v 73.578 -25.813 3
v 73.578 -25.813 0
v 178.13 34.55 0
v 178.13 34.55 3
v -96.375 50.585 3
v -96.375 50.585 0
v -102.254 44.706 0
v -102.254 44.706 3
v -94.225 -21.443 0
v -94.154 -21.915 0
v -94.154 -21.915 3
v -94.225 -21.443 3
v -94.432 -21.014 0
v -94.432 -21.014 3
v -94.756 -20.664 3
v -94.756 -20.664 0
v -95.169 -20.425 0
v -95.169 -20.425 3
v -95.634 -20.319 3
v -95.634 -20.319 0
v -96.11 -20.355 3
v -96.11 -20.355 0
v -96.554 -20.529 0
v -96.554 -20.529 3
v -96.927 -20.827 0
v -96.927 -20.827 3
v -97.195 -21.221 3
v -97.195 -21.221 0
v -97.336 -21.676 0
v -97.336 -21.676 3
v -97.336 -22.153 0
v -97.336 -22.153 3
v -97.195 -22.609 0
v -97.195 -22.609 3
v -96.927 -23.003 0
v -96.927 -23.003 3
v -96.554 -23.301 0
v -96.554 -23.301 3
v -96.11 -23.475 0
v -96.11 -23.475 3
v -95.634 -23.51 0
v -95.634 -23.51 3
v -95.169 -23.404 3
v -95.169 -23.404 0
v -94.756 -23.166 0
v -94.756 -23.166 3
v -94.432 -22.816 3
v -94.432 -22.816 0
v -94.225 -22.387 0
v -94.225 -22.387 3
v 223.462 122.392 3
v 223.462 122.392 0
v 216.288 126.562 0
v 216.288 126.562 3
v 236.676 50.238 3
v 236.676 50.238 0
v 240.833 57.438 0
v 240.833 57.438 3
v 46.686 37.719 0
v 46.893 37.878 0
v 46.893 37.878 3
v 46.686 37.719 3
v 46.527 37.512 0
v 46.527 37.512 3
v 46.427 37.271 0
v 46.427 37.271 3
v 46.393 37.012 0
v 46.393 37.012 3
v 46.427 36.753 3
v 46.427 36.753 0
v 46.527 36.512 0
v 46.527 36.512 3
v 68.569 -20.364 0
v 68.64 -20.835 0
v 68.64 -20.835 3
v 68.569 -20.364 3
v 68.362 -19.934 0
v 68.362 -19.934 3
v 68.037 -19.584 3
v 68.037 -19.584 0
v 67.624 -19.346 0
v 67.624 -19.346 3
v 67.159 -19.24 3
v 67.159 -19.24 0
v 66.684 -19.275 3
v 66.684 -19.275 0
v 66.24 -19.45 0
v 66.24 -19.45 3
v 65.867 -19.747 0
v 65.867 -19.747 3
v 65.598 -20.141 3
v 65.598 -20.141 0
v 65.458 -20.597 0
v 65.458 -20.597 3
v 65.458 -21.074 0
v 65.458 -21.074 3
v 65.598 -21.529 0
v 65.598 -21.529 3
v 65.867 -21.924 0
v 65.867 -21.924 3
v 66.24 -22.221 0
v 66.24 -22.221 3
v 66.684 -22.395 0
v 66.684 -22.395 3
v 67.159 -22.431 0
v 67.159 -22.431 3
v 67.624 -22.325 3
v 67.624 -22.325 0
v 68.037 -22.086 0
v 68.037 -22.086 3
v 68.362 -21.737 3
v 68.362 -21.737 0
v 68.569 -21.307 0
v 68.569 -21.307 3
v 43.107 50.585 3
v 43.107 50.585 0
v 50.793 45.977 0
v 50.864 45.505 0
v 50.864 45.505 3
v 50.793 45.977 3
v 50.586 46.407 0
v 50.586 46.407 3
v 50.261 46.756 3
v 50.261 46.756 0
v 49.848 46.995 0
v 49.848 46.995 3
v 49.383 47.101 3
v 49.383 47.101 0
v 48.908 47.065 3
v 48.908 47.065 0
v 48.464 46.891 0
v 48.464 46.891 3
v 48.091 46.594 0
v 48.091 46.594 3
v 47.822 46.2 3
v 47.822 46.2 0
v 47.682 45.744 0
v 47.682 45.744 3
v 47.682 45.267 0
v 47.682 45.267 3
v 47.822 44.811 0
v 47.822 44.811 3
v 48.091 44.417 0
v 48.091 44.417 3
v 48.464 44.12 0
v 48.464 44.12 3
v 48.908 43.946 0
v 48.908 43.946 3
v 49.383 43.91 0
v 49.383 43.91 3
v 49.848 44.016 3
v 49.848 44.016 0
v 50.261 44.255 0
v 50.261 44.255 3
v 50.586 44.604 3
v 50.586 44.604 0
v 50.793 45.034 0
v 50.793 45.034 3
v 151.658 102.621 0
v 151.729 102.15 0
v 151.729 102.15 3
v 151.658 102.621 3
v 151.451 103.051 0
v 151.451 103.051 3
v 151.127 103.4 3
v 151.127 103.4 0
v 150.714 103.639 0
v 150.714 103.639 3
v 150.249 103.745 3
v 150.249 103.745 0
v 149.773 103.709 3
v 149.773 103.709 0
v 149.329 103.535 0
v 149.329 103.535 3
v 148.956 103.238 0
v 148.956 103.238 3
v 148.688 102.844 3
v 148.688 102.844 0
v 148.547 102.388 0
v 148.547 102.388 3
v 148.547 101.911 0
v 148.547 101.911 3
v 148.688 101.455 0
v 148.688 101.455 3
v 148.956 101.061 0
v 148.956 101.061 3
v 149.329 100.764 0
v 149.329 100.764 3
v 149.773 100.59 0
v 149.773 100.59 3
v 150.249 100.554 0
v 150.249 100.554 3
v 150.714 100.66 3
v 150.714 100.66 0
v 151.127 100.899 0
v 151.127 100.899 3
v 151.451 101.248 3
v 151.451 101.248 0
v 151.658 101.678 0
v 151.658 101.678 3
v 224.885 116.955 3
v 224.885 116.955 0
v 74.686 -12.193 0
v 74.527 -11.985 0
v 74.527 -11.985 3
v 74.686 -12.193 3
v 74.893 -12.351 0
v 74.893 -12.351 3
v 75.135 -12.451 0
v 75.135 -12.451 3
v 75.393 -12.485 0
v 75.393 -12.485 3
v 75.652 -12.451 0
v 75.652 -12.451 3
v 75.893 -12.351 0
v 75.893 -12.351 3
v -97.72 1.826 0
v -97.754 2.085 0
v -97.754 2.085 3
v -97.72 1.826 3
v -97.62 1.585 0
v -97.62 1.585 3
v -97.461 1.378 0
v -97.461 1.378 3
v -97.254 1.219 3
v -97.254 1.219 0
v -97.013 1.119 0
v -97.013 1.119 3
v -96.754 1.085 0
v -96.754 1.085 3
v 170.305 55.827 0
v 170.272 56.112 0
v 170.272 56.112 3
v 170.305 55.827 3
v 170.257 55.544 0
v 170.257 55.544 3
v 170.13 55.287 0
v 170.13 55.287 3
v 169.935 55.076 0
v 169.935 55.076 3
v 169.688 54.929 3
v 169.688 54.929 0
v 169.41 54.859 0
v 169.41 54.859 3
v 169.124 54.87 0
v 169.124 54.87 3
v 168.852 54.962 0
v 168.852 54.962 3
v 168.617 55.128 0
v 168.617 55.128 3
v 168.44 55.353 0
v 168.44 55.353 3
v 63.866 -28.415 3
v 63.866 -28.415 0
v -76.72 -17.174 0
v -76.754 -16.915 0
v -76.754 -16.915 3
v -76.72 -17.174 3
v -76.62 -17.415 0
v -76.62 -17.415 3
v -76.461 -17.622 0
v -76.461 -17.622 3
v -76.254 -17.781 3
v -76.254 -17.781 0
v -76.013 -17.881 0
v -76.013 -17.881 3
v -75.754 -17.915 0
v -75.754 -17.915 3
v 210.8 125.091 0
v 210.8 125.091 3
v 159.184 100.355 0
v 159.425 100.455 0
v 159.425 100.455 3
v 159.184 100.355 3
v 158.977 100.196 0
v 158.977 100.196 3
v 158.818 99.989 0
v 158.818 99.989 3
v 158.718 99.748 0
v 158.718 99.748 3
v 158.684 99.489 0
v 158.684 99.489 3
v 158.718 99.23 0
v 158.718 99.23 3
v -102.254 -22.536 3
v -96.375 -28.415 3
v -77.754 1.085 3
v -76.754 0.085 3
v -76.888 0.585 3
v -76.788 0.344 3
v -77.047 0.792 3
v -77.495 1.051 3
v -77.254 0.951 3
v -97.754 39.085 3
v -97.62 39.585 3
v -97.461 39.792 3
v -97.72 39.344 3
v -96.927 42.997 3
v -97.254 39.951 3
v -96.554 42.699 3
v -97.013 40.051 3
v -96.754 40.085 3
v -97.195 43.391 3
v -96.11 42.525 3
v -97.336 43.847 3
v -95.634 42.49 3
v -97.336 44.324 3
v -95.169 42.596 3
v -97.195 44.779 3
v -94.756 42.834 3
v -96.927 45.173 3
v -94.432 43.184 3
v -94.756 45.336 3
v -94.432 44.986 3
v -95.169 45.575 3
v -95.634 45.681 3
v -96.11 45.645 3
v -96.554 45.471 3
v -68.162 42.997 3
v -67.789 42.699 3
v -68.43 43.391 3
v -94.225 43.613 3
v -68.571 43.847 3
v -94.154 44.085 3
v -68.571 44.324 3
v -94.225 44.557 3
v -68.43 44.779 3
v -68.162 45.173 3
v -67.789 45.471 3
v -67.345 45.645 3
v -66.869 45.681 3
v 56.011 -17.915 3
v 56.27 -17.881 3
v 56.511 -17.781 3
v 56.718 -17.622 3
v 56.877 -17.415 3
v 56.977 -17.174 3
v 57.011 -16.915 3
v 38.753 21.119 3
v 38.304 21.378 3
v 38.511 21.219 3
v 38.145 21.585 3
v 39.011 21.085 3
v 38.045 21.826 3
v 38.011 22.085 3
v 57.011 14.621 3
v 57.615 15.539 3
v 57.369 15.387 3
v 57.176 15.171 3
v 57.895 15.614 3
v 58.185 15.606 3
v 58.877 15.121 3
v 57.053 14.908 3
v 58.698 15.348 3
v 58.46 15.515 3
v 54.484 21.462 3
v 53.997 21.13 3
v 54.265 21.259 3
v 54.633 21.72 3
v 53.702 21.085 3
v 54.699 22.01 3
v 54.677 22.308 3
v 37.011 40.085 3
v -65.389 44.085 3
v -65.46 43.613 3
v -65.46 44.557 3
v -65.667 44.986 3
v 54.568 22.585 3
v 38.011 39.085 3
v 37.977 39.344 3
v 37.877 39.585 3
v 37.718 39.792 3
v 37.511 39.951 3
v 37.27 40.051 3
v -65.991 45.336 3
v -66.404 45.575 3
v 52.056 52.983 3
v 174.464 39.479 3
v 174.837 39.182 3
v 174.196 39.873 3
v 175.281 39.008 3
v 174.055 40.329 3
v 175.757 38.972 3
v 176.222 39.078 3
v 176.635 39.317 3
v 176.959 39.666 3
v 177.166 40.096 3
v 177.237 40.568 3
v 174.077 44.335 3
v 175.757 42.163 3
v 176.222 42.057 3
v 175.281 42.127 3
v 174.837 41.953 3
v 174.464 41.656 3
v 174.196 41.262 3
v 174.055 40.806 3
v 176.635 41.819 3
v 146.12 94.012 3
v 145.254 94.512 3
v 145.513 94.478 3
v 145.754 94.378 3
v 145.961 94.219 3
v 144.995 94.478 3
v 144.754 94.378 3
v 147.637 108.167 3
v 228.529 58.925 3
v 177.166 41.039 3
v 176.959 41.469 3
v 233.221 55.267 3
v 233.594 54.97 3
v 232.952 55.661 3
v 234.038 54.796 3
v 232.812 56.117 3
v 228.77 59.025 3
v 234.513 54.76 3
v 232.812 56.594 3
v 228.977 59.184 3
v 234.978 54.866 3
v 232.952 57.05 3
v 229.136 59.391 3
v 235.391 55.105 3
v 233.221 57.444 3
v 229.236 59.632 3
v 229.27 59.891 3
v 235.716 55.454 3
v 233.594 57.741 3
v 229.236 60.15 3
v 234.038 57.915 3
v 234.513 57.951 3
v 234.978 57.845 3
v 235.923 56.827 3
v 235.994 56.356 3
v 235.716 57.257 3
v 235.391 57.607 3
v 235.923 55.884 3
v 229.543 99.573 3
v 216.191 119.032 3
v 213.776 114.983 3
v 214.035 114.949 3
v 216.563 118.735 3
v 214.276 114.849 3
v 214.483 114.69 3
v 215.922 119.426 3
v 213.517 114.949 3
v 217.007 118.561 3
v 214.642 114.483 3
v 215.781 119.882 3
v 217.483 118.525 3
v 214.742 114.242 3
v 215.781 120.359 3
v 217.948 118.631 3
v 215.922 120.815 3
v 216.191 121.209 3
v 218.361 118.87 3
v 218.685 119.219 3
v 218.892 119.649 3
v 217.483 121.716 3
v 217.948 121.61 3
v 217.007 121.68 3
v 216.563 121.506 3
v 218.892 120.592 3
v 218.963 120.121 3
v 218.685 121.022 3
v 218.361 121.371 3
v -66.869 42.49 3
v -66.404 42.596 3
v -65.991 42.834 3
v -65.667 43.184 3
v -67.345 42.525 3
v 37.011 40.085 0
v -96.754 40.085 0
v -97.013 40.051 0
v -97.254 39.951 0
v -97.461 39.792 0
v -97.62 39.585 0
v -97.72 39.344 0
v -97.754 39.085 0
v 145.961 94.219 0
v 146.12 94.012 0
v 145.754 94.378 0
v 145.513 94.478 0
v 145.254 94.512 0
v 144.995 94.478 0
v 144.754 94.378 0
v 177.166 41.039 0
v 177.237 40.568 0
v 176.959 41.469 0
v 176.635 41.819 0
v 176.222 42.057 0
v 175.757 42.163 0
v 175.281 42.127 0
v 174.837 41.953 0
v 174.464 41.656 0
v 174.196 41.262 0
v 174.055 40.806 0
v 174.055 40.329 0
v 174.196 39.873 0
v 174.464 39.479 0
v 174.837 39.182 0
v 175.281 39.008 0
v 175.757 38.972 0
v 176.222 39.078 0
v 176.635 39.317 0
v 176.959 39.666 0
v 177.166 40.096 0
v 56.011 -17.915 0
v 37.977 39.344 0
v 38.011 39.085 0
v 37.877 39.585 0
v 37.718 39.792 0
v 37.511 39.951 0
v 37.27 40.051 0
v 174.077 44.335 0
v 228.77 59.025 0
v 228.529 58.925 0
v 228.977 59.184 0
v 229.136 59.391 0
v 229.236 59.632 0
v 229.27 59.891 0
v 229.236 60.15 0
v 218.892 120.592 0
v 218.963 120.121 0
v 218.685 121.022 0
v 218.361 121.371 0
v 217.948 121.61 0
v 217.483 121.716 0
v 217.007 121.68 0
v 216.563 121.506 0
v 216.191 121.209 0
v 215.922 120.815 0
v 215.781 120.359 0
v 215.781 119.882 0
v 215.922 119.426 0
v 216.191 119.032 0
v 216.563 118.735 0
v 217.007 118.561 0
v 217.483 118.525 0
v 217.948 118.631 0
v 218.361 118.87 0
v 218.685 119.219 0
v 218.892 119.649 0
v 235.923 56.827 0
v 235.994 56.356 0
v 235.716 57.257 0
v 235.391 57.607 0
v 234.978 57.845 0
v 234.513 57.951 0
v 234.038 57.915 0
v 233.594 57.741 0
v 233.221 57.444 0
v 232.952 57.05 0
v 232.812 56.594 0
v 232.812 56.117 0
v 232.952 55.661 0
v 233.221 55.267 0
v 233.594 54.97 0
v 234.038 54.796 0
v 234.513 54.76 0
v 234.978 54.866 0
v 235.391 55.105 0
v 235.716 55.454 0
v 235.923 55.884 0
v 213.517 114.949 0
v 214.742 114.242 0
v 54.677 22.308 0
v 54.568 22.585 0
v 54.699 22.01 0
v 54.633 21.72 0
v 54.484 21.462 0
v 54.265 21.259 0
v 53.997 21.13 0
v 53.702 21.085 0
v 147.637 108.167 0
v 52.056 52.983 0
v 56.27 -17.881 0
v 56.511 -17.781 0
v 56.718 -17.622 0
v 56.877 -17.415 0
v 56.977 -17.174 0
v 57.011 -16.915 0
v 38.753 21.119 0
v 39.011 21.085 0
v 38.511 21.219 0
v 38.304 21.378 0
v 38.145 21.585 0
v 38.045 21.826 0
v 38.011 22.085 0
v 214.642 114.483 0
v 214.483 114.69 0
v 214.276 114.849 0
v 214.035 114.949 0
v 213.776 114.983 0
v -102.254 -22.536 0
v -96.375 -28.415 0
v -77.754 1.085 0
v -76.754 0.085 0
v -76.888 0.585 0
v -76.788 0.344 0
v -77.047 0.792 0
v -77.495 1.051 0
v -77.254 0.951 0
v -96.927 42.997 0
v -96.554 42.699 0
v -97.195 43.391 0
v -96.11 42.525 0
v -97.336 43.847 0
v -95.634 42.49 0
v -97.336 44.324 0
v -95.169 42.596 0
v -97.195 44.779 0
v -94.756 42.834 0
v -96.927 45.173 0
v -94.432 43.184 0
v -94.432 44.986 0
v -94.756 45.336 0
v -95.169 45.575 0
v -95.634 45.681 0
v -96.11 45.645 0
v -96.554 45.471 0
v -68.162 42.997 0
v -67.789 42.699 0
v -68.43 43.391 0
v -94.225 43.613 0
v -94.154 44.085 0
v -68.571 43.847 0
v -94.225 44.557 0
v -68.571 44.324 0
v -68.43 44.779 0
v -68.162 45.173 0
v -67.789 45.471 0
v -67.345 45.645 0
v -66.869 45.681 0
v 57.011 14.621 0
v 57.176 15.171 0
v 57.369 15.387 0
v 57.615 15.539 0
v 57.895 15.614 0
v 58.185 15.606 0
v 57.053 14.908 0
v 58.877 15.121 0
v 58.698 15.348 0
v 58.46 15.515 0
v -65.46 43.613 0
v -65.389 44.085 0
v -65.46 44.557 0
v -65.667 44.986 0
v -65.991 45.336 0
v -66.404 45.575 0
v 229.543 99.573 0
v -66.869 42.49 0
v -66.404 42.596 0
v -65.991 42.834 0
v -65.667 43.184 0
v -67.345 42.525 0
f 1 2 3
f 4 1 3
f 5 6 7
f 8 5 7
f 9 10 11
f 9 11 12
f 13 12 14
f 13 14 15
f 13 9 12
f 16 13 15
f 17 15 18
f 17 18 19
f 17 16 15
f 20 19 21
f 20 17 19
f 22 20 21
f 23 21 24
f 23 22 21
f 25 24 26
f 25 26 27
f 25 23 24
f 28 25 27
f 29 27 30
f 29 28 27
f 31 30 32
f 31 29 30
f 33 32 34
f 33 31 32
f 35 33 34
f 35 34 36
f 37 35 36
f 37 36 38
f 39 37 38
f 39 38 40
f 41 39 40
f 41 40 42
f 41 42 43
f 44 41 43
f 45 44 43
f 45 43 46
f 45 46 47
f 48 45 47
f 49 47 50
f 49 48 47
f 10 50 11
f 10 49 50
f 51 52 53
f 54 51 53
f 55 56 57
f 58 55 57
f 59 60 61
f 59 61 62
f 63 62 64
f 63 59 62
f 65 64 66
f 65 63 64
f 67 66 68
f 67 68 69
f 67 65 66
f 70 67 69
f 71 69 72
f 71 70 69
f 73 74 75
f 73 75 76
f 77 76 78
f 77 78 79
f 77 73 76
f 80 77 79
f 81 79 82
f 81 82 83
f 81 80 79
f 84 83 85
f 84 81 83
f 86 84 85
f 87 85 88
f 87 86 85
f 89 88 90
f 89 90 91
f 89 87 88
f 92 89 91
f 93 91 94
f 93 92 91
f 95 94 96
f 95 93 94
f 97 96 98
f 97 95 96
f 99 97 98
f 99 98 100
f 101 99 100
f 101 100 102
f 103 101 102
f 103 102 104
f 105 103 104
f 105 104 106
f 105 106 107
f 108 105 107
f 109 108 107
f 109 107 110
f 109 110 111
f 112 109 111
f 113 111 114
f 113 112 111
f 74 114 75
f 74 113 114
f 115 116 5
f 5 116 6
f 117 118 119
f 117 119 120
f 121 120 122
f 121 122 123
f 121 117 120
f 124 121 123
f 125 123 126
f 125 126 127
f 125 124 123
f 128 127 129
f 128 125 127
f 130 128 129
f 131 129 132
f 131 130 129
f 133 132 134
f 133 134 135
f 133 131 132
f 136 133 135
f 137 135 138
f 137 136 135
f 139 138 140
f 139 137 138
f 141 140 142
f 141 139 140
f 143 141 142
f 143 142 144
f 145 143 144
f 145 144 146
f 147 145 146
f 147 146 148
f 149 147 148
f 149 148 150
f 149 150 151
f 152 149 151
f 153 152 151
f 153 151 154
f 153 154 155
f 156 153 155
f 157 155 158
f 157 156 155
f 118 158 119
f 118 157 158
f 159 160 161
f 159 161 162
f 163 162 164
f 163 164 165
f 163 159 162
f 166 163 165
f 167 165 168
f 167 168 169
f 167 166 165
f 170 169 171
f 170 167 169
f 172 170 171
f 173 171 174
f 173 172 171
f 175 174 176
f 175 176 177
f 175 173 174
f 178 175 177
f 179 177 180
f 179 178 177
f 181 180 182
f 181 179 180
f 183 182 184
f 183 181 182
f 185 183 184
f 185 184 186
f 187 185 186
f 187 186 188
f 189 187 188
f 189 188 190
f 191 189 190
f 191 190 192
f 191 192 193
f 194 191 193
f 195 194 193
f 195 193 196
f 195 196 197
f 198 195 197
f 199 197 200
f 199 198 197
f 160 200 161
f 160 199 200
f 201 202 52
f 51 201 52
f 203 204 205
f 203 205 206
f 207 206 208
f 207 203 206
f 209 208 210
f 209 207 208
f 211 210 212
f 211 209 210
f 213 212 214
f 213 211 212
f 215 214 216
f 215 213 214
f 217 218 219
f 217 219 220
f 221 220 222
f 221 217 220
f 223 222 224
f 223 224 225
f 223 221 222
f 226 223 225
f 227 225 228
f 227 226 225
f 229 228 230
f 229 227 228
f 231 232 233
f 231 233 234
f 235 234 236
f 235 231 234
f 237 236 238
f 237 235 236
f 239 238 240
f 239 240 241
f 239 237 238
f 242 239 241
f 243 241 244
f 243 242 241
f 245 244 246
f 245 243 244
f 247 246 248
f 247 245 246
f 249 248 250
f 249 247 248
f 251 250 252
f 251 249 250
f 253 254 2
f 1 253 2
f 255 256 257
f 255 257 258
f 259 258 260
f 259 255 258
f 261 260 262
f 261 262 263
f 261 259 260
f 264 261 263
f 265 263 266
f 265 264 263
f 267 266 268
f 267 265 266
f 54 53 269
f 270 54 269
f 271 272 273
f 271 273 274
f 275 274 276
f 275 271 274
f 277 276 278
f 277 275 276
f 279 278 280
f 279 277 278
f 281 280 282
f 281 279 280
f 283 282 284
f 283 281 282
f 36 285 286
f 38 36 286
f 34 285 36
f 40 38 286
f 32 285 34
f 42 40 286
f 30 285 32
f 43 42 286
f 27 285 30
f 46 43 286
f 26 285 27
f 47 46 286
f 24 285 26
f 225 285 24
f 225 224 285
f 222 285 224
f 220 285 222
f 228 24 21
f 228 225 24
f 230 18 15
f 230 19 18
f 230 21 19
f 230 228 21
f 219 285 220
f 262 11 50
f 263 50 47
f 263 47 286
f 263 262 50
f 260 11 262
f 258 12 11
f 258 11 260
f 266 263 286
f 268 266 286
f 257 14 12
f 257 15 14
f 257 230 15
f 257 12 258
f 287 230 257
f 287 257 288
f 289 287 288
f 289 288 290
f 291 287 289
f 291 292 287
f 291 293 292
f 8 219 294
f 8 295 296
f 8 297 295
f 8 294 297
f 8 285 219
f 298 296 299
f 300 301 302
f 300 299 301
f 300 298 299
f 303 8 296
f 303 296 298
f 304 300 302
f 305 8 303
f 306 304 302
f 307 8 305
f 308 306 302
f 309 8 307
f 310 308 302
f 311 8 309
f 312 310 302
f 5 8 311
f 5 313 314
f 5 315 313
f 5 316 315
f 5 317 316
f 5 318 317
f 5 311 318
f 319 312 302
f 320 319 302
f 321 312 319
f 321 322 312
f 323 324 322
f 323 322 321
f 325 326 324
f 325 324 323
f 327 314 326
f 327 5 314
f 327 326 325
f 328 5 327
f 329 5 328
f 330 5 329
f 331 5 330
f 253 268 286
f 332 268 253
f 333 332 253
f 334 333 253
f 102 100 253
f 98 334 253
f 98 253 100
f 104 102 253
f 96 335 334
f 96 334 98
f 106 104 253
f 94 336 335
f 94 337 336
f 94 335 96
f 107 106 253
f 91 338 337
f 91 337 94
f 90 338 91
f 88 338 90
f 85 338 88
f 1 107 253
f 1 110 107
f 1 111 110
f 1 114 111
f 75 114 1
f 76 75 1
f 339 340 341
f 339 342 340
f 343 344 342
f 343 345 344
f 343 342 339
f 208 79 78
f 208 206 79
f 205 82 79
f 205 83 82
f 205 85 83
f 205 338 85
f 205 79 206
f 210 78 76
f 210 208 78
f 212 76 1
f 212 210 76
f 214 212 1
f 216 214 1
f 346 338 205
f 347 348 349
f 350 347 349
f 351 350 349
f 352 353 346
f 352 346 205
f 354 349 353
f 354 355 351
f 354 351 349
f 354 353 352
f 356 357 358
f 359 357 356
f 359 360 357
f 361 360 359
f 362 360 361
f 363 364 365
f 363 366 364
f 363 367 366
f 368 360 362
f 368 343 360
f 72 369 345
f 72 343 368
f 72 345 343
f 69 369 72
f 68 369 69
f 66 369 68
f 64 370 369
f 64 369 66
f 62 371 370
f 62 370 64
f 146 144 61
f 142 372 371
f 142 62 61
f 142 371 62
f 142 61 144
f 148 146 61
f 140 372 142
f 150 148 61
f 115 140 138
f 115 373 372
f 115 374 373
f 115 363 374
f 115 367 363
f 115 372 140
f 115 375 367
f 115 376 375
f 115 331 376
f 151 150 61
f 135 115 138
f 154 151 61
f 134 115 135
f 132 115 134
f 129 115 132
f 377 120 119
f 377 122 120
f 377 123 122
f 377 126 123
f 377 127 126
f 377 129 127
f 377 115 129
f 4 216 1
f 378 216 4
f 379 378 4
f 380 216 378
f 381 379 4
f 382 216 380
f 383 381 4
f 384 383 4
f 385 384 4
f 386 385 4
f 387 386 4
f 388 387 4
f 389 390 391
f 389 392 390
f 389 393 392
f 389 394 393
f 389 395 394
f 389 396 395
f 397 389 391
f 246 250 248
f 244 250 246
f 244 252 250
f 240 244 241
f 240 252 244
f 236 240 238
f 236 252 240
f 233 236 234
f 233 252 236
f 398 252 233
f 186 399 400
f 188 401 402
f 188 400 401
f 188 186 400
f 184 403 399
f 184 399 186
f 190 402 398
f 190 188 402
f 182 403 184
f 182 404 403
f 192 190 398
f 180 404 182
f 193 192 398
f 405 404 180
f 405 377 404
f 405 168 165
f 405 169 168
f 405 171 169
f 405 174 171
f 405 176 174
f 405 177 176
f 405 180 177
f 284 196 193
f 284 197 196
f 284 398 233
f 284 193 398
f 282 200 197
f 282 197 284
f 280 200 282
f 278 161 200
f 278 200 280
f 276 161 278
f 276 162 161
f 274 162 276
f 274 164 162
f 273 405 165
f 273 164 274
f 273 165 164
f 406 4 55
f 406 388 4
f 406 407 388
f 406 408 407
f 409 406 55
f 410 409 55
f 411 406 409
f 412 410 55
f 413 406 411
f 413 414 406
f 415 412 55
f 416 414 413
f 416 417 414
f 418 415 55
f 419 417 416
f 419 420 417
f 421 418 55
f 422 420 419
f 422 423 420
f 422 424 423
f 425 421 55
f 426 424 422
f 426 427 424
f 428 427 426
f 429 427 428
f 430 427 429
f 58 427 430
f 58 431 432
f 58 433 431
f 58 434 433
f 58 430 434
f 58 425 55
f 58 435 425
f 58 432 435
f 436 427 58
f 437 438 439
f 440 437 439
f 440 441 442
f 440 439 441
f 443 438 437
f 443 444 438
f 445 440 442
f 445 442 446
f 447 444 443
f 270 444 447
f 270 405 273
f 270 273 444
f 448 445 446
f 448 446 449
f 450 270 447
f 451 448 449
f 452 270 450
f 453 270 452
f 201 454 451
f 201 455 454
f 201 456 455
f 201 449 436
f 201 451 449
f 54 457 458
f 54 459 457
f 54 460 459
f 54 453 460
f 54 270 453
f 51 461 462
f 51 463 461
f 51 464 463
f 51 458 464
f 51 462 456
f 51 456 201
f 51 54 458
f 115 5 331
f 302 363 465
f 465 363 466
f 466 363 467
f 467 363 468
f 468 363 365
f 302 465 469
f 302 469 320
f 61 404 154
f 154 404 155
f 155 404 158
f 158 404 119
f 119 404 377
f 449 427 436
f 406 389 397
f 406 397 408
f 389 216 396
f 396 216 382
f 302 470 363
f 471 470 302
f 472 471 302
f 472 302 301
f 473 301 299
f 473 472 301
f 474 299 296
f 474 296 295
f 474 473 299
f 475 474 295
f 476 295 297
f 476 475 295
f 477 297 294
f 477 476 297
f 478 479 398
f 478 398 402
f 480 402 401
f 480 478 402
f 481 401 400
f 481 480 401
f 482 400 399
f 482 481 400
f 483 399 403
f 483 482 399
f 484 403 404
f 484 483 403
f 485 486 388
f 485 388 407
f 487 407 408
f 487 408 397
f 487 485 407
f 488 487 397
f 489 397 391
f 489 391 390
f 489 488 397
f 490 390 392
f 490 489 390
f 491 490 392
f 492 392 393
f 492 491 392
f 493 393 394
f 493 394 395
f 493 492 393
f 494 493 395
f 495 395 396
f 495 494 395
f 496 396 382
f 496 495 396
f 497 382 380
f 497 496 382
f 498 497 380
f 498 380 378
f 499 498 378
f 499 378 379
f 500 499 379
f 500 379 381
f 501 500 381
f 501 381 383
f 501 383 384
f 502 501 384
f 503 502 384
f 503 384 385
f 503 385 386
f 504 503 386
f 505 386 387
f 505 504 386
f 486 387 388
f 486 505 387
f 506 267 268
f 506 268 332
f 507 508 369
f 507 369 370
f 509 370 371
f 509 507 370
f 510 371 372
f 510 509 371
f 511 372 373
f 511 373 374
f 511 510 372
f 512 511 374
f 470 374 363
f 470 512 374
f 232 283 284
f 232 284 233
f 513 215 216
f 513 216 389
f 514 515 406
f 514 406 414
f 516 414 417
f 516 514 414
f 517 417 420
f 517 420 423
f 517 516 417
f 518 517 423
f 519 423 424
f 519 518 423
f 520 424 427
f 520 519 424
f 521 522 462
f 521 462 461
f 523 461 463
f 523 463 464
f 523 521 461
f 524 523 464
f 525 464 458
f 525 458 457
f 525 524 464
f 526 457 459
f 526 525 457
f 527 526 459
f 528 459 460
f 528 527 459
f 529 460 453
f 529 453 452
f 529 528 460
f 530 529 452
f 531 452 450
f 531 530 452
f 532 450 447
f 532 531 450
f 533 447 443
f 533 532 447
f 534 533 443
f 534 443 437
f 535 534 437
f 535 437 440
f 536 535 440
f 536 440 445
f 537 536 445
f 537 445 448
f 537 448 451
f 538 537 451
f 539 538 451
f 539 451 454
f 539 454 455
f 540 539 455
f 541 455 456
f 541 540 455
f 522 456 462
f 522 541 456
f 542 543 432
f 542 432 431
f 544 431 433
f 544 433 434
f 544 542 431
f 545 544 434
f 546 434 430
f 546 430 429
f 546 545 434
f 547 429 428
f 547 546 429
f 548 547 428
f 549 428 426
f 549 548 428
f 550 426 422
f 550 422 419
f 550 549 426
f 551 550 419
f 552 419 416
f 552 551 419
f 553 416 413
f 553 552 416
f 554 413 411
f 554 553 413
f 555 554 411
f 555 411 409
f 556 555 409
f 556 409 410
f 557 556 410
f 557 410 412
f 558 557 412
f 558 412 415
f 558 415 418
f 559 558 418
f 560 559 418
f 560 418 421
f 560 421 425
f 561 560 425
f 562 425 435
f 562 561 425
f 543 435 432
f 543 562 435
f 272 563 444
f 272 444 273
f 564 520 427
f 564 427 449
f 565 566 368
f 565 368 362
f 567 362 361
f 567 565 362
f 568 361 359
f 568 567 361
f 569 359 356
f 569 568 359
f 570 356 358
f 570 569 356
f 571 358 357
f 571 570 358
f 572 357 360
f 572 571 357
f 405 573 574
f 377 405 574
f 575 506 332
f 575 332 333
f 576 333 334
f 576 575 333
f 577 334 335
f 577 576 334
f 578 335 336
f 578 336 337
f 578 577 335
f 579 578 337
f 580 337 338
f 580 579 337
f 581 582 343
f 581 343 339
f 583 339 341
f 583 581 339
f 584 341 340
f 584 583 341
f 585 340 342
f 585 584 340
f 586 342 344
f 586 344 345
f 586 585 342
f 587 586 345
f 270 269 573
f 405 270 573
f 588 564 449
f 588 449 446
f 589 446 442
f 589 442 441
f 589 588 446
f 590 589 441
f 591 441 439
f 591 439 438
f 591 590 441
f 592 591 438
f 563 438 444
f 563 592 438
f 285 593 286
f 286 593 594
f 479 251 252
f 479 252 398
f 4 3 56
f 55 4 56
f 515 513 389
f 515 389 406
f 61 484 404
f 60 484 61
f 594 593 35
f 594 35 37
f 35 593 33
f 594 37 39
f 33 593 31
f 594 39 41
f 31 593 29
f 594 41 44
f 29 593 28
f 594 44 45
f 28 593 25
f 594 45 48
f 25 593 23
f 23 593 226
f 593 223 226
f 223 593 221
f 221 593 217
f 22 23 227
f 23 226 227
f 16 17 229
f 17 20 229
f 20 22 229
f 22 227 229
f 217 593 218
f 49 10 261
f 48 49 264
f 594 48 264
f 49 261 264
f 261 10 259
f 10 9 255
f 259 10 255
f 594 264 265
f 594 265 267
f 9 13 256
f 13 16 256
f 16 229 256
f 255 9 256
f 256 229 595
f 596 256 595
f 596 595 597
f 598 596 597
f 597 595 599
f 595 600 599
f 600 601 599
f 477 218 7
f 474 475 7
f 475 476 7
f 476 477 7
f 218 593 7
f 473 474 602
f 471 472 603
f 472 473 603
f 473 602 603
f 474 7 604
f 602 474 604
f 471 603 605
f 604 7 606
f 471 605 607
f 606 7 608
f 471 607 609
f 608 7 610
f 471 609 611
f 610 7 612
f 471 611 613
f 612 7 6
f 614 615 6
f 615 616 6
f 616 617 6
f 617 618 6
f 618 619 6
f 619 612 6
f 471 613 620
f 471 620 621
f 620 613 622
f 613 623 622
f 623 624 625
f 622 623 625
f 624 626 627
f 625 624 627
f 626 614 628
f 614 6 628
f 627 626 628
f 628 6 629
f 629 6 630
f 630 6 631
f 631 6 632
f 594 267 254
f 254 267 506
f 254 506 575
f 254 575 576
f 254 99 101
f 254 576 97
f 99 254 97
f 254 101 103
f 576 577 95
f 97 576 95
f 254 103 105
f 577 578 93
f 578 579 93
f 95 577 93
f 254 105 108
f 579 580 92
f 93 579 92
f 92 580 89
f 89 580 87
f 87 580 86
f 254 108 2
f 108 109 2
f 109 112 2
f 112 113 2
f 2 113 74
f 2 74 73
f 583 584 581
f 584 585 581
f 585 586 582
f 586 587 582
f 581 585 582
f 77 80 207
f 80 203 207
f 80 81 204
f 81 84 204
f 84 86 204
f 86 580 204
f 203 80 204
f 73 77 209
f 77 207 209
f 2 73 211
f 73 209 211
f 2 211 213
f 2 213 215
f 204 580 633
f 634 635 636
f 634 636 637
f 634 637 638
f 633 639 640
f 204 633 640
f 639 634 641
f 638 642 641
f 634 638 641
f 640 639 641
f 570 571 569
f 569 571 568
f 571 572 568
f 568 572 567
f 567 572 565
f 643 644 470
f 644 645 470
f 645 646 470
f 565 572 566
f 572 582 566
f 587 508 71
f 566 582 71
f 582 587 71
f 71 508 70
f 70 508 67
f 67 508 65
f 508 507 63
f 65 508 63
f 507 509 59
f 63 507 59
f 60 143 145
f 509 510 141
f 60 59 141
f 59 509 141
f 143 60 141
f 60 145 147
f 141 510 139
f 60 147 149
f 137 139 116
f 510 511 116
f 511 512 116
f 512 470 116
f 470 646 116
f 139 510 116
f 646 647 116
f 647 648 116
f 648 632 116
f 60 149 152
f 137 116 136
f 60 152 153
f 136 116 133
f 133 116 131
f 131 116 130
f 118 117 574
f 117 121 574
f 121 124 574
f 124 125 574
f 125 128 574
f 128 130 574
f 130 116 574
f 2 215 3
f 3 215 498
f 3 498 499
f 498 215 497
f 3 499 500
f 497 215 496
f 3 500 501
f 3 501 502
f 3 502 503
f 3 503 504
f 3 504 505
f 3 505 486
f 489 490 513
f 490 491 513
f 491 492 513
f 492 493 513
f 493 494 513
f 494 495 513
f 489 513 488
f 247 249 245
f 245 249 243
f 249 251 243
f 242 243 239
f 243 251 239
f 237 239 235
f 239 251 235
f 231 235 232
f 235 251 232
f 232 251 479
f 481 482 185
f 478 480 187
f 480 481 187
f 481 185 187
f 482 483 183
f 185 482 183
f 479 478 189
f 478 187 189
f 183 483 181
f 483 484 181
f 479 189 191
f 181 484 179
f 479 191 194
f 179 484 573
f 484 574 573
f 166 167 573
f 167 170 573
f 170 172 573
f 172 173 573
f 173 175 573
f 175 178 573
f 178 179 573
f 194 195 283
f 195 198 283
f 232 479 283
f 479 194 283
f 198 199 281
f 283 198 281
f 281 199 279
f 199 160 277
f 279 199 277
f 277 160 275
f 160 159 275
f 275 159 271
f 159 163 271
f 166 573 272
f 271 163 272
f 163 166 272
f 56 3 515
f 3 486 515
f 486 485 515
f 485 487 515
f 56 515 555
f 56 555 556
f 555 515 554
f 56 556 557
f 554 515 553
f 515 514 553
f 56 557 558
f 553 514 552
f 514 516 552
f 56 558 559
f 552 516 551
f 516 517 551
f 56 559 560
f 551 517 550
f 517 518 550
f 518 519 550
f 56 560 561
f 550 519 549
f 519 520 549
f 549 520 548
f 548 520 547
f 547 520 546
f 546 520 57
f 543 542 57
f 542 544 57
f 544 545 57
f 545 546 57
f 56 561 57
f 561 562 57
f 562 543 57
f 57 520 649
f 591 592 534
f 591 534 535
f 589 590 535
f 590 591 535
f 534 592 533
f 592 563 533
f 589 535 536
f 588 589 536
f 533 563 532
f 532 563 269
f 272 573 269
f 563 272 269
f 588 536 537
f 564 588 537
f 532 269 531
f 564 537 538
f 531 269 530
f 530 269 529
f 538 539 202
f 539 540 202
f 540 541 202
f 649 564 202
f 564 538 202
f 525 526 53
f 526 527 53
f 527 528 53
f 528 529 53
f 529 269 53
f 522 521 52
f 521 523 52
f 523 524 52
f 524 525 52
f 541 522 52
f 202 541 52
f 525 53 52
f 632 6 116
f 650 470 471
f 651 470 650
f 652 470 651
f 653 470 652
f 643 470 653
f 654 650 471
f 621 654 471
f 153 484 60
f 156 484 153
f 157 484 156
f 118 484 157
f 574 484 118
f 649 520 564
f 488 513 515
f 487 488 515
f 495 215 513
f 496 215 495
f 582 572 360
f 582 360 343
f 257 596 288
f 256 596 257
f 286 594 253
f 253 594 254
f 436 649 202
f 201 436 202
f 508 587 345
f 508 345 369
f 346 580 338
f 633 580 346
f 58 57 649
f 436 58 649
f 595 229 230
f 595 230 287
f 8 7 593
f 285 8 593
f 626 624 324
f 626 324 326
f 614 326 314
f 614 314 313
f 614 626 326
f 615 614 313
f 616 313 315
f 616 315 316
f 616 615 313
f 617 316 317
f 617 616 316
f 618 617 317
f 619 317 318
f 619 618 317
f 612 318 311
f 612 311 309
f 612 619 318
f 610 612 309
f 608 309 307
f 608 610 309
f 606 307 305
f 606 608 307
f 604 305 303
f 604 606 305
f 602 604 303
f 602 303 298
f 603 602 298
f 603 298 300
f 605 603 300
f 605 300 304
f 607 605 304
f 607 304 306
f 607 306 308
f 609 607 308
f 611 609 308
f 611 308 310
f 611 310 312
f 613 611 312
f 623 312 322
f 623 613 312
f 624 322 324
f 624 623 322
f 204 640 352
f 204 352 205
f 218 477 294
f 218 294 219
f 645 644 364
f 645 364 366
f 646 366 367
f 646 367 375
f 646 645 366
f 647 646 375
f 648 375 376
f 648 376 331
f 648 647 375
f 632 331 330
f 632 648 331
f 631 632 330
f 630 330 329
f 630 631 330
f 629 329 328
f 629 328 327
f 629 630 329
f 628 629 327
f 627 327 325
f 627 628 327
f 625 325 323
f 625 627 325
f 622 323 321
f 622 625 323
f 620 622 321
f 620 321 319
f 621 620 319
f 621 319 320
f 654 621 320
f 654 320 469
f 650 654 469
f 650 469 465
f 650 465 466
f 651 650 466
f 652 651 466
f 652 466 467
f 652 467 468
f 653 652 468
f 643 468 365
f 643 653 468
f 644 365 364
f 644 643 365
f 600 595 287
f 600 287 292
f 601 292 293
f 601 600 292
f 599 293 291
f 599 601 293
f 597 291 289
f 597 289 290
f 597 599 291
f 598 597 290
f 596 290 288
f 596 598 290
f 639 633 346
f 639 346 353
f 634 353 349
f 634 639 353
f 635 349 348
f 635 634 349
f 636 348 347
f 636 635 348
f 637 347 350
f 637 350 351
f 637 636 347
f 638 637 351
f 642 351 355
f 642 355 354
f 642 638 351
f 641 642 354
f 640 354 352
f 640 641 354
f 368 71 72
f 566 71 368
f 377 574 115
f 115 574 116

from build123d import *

# Parameters (mm, degrees)
ESQUISSE1_R        = 1.6
BOSS_EXTRU_1_DEPTH = 3


with BuildPart() as part:
    # Esquisse1 → Boss.-Extru.1 (new body)
    with BuildSketch(Plane.XY):
        Polygon((-75.988646329, 50.585106383), (-96.375082906, 50.585106383), (-102.253762562, 44.706426727), (-102.253762562, 35.79522772), (-102.253762562, -22.536213961), (-96.375082906, -28.414893617), (63.866204609, -28.414893617), (73.57783127, -25.812671096), (178.129773206, 34.550420725), (236.676113061, 50.237865209), (240.83296731, 57.437747969), (229.542938833, 99.572707865), (224.885316316, 116.95519174), (223.46218398, 122.391704558), (216.287606244, 126.561599525), (210.79963, 125.091100722), (147.636911389, 108.166701279), (52.055735868, 52.982883862), (43.107108491, 50.585106383), align=None)
        with Locations((-95.753762562, 44.085106383)):
            Circle(ESQUISSE1_R, mode=Mode.SUBTRACT)
        with Locations((-66.988646329, 44.085106383)):
            Circle(ESQUISSE1_R, mode=Mode.SUBTRACT)
        with Locations((-95.753762562, -21.914893617)):
            Circle(ESQUISSE1_R, mode=Mode.SUBTRACT)
        with Locations((49.263745973, 45.505477252)):
            Circle(ESQUISSE1_R, mode=Mode.SUBTRACT)
        with Locations((67.039694146, -20.835264486)):
            Circle(ESQUISSE1_R, mode=Mode.SUBTRACT)
        with Locations((175.637377655, 40.567595866)):
            Circle(ESQUISSE1_R, mode=Mode.SUBTRACT)
        with Locations((234.393639901, 56.355573542)):
            Circle(ESQUISSE1_R, mode=Mode.SUBTRACT)
        with Locations((217.363403759, 120.120565138)):
            Circle(ESQUISSE1_R, mode=Mode.SUBTRACT)
        with Locations((150.12930694, 102.149526137)):
            Circle(ESQUISSE1_R, mode=Mode.SUBTRACT)
        with BuildLine():
            Line((-97.753762562, 39.085106383), (-97.753762562, 2.085106383))
            ThreePointArc((-97.753762562, 2.085106383), (-97.460869343, 1.377999602), (-96.753762562, 1.085106383))
            Line((-96.753762562, 1.085106383), (-77.753762562, 1.085106383))
            ThreePointArc((-77.753762562, 1.085106383), (-77.046655781, 0.792213164), (-76.753762562, 0.085106383))
            Line((-76.753762562, 0.085106383), (-76.753762562, -16.914893617))
            ThreePointArc((-76.753762562, -16.914893617), (-76.460869343, -17.622000398), (-75.753762562, -17.914893617))
            Line((-75.753762562, -17.914893617), (56.011353671, -17.914893617))
            ThreePointArc((56.011353671, -17.914893617), (56.718460453, -17.622000398), (57.011353671, -16.914893617))
            Line((57.011353671, -16.914893617), (57.011353671, 14.621004768))
            ThreePointArc((57.011353671, 14.621004768), (57.752534626, 15.586930594), (58.877379075, 15.121004768))
            Line((58.877379075, 15.121004768), (74.527293708, -11.98544251))
            ThreePointArc((74.527293708, -11.98544251), (75.134500067, -12.451368337), (75.893319112, -12.351467914))
            Line((75.893319112, -12.351467914), (174.076924484, 44.334863077))
            Line((174.076924484, 44.334863077), (228.528734589, 58.925181621))
            ThreePointArc((228.528734589, 58.925181621), (229.135940948, 59.391107448), (229.235841371, 60.149926493))
            Line((229.235841371, 60.149926493), (214.741974845, 114.241772765))
            ThreePointArc((214.741974845, 114.241772765), (214.276049019, 114.848979124), (213.517229973, 114.948879546))
            Line((213.517229973, 114.948879546), (159.425383701, 100.45501302))
            ThreePointArc((159.425383701, 100.45501302), (158.818177343, 99.989087194), (158.71827692, 99.230268149))
            Line((158.71827692, 99.230268149), (170.271736655, 56.112169417))
            ThreePointArc((170.271736655, 56.112169417), (169.688494261, 54.929470839), (168.439785425, 55.353350371))
            Line((168.439785425, 55.353350371), (146.120215143, 94.011980101))
            ThreePointArc((146.120215143, 94.011980101), (145.513008785, 94.477905928), (144.75418974, 94.378005505))
            Line((144.75418974, 94.378005505), (46.893319112, 37.878005505))
            ThreePointArc((46.893319112, 37.878005505), (46.427393286, 37.270799147), (46.527293708, 36.511980101))
            Line((46.527293708, 36.511980101), (54.567977999, 22.585106383))
            ThreePointArc((54.567977999, 22.585106383), (54.567977999, 21.585106383), (53.701952595, 21.085106383))
            Line((53.701952595, 21.085106383), (39.011353671, 21.085106383))
            ThreePointArc((39.011353671, 21.085106383), (38.30424689, 21.377999602), (38.011353671, 22.085106383))
            Line((38.011353671, 22.085106383), (38.011353671, 39.085106383))
            ThreePointArc((38.011353671, 39.085106383), (37.718460453, 39.792213164), (37.011353671, 40.085106383))
            Line((37.011353671, 40.085106383), (-96.753762562, 40.085106383))
            ThreePointArc((-96.753762562, 40.085106383), (-97.460869343, 39.792213164), (-97.753762562, 39.085106383))
        make_face(mode=Mode.SUBTRACT)
    extrude(amount=BOSS_EXTRU_1_DEPTH)


solid = part.part
